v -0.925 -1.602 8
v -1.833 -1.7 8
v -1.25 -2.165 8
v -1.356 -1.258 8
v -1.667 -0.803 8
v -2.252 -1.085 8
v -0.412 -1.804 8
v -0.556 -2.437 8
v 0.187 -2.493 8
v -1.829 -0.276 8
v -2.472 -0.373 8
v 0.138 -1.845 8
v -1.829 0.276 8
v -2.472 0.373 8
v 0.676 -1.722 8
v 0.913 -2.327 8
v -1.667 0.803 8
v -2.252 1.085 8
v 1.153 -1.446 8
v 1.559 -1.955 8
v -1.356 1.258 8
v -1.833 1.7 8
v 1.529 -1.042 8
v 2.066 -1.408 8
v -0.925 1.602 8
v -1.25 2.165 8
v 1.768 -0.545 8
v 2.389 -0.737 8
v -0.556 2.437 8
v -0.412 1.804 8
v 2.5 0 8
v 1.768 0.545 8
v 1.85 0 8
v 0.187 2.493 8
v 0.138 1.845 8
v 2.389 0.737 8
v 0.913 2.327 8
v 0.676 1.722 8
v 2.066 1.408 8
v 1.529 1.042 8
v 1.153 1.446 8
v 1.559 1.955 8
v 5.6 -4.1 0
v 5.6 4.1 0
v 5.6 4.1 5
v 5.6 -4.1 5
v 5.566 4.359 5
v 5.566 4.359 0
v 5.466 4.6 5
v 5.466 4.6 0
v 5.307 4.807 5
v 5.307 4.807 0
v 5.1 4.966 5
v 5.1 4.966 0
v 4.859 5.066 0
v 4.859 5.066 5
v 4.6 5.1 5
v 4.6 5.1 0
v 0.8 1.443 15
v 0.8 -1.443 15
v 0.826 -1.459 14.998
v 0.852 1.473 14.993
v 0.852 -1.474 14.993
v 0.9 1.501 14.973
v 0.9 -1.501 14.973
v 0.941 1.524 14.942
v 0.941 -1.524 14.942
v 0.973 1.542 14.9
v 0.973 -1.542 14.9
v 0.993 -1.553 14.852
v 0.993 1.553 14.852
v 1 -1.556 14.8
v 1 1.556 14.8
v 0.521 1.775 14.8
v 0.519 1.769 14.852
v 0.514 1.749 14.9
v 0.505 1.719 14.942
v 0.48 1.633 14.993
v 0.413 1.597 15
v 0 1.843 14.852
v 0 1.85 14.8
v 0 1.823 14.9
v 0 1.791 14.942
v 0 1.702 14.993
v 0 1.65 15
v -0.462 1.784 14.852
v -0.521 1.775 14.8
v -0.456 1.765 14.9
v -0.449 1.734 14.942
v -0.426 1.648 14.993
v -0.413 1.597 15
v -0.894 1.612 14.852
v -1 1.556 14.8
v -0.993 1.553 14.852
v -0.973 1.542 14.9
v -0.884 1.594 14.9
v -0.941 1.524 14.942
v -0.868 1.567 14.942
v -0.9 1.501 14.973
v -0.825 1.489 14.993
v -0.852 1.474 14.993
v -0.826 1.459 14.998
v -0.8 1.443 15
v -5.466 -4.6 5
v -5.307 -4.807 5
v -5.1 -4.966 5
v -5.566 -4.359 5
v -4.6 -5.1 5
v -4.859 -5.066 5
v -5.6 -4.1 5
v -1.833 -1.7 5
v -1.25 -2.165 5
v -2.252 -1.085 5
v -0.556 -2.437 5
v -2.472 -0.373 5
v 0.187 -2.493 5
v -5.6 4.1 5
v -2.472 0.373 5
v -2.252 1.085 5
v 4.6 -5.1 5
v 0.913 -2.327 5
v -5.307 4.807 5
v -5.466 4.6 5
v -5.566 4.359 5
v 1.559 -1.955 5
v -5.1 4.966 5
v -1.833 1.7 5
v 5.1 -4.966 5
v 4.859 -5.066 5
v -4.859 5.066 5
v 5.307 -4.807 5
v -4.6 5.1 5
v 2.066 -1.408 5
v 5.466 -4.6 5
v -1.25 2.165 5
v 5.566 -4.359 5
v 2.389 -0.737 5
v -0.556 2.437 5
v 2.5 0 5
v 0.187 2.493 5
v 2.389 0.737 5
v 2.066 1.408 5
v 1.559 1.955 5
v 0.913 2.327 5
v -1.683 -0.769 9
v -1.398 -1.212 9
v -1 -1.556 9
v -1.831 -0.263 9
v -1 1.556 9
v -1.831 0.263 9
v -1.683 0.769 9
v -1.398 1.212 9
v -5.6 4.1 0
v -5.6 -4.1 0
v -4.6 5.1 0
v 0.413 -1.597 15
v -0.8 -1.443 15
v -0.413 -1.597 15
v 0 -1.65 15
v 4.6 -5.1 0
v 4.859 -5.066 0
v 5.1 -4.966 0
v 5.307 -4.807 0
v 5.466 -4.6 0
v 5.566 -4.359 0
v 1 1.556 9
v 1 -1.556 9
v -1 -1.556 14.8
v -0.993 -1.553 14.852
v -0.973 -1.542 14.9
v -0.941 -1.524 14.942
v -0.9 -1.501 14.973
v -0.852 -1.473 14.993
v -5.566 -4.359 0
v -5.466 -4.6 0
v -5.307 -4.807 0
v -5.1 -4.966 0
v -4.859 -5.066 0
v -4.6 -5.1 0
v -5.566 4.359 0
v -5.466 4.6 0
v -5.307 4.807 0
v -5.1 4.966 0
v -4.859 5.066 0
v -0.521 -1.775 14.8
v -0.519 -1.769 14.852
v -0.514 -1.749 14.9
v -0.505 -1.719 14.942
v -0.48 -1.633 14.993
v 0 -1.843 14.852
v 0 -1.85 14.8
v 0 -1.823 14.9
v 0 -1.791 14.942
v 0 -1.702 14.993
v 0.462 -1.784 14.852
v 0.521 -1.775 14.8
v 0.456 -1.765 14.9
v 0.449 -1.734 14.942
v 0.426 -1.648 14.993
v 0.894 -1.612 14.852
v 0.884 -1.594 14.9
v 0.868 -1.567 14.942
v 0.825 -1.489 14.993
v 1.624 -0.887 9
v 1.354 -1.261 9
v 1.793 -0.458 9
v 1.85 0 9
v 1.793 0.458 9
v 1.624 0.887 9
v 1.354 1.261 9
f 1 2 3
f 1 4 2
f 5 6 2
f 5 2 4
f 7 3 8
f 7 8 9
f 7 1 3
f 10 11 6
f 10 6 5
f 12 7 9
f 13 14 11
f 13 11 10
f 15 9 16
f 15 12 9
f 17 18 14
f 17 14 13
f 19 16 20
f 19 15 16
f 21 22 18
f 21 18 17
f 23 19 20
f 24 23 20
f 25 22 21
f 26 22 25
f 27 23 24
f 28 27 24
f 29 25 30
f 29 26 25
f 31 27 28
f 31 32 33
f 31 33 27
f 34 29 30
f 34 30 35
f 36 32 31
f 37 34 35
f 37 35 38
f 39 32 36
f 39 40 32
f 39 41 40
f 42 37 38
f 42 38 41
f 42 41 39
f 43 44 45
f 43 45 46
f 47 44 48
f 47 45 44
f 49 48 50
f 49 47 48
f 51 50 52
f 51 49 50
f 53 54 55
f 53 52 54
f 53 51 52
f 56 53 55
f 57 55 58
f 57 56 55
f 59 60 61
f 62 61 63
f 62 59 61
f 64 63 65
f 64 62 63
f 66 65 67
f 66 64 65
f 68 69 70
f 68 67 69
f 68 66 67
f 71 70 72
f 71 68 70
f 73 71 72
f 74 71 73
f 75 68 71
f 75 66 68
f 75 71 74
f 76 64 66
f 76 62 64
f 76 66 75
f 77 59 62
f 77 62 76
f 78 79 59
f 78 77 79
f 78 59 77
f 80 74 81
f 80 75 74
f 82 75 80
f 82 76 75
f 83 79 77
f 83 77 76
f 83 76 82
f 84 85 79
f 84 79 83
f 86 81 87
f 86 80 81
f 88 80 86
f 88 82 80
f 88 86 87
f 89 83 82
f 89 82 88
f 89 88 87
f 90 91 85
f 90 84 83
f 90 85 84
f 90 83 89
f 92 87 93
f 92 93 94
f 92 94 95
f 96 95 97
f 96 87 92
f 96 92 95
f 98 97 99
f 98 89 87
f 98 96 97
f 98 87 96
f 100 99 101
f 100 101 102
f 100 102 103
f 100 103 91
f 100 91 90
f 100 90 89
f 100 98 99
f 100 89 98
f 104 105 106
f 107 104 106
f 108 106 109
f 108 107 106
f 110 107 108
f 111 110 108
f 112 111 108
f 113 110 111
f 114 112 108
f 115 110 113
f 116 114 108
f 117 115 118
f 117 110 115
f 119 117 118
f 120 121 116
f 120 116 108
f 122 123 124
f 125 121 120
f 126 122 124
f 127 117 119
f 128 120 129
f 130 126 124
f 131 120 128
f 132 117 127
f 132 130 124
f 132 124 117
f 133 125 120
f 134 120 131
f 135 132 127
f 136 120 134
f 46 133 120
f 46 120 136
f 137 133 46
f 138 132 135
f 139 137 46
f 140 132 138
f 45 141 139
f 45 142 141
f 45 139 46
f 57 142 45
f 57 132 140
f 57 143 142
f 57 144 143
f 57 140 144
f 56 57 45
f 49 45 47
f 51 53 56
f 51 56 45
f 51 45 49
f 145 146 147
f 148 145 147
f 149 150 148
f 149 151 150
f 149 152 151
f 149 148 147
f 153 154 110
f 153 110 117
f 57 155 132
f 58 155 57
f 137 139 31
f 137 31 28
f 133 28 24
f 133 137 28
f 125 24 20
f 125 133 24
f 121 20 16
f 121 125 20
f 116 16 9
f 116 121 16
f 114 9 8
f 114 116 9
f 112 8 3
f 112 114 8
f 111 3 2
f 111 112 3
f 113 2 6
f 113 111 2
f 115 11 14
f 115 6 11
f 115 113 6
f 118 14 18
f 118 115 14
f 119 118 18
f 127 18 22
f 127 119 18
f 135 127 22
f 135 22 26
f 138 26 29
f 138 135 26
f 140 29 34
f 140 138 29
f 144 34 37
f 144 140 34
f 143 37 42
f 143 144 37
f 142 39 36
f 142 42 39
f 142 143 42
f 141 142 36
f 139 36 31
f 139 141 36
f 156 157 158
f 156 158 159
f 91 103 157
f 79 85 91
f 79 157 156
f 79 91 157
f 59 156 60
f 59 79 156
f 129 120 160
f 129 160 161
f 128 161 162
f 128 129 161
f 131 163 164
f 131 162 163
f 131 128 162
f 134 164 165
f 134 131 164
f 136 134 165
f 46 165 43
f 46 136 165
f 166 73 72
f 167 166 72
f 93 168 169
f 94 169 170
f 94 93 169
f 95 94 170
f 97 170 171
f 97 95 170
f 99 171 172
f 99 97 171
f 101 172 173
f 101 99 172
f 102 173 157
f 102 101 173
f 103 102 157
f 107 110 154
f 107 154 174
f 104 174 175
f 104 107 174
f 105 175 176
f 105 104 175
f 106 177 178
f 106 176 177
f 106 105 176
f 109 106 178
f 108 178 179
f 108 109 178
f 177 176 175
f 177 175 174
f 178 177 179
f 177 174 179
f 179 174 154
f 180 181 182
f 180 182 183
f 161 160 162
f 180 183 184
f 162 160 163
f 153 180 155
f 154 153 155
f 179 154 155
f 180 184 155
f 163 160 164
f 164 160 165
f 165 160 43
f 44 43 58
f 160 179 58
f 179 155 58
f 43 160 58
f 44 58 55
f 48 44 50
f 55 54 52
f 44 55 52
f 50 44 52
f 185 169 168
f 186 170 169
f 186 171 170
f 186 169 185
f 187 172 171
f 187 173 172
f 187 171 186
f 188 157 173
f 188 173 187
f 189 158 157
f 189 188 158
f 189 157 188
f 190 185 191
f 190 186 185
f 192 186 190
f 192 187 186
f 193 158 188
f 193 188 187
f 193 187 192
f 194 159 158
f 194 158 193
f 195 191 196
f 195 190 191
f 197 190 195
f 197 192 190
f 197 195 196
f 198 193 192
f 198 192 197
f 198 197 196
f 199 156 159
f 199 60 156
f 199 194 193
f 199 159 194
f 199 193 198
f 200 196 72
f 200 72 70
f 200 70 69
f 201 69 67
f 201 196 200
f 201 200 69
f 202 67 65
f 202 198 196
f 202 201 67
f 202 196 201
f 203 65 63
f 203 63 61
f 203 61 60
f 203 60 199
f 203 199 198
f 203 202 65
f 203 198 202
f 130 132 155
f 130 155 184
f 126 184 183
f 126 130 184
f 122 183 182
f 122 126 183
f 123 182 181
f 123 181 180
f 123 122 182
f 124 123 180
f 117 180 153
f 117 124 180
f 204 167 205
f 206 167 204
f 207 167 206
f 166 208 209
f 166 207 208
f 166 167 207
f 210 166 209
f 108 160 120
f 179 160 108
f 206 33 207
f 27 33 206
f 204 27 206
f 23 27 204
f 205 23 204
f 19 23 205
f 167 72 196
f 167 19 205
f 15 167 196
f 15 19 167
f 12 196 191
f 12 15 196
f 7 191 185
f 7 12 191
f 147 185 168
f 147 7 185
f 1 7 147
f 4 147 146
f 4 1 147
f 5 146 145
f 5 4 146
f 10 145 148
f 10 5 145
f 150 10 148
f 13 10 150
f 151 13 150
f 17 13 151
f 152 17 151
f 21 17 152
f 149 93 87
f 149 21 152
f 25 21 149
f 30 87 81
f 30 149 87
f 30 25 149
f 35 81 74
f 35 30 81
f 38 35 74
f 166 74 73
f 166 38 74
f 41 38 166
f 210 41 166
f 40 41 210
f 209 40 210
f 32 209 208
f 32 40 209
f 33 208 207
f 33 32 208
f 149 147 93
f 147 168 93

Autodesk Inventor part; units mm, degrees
ref_plane "YZ Plane" through (0, 0, 0) normal (1, 0, 0) x (0, 1, 0)
ref_plane "XZ Plane" through (0, 0, 0) normal (0, 1, 0) x (-1, 0, 0)
sketch "Эскиз1" plane through (0, 0, 0) normal (0, 0, 1) x (1, 0, 0)
  line L0 (-5.6, 5.1) -> (5.6, 5.1)
  line L1 (5.6, 5.1) -> (5.6, -5.1)
  line L2 (5.6, -5.1) -> (-5.6, -5.1)
  line L3 (-5.6, -5.1) -> (-5.6, 5.1)
  line L4 (-5.6, 5.1) -> (5.6, -5.1) construction
  line L5 (5.6, 5.1) -> (-5.6, -5.1) construction
  point P0 (0, 0)
  dimension "d0" = 11.2
  dimension "d1" = 10.2
extrude "Выдавливание1" add sketch "Эскиз1" along normal blind 5
fillet "Сопряжение1" radius 1 4 edges at (-5.6, 5.1, 2.5) (5.6, 5.1, 2.5) (5.6, -5.1, 2.5) (-5.6, -5.1, 2.5)
sketch "Эскиз2" plane through (0, 0, 5) normal (0, 0, 1) x (1, 0, 0)
  circle A0 centre (0, 0) radius 2.5
  dimension "d5" = 5
extrude "Выдавливание2" add sketch "Эскиз2" along normal blind 3
sketch "Эскиз3" plane through (0, 0, 8) normal (0, 0, 1) x (1, 0, 0)
  circle A0 centre (0, 0) radius 1.85
  dimension "d8" = 3.7
extrude "Выдавливание3" add sketch "Эскиз3" along normal blind 7
sketch "Эскиз4" plane through (0, 0, 15) normal (0, 0, 1) x (1, 0, 0)
  line L0 (1, -5) -> (-1, -5)
  line L1 (-1, -5) -> (-1, 5)
  line L2 (-1, 5) -> (1, 5)
  line L3 (1, 5) -> (1, -5)
  line L4 (1, -5) -> (-1, 5) construction
  line L5 (-1, -5) -> (1, 5) construction
  line L6 (-1, 5) -> (-9.7743, 5)
  line L7 (-9.7743, 5) -> (-9.7743, -5)
  line L8 (-9.7743, -5) -> (-1, -5)
  line L9 (-1, -5) -> (-1, 5)
  line L10 (1, -5) -> (12.6944, -5)
  line L11 (12.6944, -5) -> (12.6944, 8.8009)
  line L12 (12.6944, 8.8009) -> (1, 8.8009)
  line L13 (1, 8.8009) -> (1, -5)
  point P0 (0, 0)
  dimension "d11" = 2
  dimension "d12" = 10
extrude "Выдавливание4" cut sketch "Эскиз4" against normal blind 6 contours L3 L13 L12 L11 L10 | L8 L7 L6 L1
fillet "Сопряжение2" radius 0.2 4 edges at (0, -1.85, 15) (0, 1.85, 15) (1, 0, 15) (-1, 0, 15)
ref_plane "РабПлоскость1" through (0, 0, 8) normal (0, 0, 1) x (1, 0, 0)
properties part number "Потенциометр"
